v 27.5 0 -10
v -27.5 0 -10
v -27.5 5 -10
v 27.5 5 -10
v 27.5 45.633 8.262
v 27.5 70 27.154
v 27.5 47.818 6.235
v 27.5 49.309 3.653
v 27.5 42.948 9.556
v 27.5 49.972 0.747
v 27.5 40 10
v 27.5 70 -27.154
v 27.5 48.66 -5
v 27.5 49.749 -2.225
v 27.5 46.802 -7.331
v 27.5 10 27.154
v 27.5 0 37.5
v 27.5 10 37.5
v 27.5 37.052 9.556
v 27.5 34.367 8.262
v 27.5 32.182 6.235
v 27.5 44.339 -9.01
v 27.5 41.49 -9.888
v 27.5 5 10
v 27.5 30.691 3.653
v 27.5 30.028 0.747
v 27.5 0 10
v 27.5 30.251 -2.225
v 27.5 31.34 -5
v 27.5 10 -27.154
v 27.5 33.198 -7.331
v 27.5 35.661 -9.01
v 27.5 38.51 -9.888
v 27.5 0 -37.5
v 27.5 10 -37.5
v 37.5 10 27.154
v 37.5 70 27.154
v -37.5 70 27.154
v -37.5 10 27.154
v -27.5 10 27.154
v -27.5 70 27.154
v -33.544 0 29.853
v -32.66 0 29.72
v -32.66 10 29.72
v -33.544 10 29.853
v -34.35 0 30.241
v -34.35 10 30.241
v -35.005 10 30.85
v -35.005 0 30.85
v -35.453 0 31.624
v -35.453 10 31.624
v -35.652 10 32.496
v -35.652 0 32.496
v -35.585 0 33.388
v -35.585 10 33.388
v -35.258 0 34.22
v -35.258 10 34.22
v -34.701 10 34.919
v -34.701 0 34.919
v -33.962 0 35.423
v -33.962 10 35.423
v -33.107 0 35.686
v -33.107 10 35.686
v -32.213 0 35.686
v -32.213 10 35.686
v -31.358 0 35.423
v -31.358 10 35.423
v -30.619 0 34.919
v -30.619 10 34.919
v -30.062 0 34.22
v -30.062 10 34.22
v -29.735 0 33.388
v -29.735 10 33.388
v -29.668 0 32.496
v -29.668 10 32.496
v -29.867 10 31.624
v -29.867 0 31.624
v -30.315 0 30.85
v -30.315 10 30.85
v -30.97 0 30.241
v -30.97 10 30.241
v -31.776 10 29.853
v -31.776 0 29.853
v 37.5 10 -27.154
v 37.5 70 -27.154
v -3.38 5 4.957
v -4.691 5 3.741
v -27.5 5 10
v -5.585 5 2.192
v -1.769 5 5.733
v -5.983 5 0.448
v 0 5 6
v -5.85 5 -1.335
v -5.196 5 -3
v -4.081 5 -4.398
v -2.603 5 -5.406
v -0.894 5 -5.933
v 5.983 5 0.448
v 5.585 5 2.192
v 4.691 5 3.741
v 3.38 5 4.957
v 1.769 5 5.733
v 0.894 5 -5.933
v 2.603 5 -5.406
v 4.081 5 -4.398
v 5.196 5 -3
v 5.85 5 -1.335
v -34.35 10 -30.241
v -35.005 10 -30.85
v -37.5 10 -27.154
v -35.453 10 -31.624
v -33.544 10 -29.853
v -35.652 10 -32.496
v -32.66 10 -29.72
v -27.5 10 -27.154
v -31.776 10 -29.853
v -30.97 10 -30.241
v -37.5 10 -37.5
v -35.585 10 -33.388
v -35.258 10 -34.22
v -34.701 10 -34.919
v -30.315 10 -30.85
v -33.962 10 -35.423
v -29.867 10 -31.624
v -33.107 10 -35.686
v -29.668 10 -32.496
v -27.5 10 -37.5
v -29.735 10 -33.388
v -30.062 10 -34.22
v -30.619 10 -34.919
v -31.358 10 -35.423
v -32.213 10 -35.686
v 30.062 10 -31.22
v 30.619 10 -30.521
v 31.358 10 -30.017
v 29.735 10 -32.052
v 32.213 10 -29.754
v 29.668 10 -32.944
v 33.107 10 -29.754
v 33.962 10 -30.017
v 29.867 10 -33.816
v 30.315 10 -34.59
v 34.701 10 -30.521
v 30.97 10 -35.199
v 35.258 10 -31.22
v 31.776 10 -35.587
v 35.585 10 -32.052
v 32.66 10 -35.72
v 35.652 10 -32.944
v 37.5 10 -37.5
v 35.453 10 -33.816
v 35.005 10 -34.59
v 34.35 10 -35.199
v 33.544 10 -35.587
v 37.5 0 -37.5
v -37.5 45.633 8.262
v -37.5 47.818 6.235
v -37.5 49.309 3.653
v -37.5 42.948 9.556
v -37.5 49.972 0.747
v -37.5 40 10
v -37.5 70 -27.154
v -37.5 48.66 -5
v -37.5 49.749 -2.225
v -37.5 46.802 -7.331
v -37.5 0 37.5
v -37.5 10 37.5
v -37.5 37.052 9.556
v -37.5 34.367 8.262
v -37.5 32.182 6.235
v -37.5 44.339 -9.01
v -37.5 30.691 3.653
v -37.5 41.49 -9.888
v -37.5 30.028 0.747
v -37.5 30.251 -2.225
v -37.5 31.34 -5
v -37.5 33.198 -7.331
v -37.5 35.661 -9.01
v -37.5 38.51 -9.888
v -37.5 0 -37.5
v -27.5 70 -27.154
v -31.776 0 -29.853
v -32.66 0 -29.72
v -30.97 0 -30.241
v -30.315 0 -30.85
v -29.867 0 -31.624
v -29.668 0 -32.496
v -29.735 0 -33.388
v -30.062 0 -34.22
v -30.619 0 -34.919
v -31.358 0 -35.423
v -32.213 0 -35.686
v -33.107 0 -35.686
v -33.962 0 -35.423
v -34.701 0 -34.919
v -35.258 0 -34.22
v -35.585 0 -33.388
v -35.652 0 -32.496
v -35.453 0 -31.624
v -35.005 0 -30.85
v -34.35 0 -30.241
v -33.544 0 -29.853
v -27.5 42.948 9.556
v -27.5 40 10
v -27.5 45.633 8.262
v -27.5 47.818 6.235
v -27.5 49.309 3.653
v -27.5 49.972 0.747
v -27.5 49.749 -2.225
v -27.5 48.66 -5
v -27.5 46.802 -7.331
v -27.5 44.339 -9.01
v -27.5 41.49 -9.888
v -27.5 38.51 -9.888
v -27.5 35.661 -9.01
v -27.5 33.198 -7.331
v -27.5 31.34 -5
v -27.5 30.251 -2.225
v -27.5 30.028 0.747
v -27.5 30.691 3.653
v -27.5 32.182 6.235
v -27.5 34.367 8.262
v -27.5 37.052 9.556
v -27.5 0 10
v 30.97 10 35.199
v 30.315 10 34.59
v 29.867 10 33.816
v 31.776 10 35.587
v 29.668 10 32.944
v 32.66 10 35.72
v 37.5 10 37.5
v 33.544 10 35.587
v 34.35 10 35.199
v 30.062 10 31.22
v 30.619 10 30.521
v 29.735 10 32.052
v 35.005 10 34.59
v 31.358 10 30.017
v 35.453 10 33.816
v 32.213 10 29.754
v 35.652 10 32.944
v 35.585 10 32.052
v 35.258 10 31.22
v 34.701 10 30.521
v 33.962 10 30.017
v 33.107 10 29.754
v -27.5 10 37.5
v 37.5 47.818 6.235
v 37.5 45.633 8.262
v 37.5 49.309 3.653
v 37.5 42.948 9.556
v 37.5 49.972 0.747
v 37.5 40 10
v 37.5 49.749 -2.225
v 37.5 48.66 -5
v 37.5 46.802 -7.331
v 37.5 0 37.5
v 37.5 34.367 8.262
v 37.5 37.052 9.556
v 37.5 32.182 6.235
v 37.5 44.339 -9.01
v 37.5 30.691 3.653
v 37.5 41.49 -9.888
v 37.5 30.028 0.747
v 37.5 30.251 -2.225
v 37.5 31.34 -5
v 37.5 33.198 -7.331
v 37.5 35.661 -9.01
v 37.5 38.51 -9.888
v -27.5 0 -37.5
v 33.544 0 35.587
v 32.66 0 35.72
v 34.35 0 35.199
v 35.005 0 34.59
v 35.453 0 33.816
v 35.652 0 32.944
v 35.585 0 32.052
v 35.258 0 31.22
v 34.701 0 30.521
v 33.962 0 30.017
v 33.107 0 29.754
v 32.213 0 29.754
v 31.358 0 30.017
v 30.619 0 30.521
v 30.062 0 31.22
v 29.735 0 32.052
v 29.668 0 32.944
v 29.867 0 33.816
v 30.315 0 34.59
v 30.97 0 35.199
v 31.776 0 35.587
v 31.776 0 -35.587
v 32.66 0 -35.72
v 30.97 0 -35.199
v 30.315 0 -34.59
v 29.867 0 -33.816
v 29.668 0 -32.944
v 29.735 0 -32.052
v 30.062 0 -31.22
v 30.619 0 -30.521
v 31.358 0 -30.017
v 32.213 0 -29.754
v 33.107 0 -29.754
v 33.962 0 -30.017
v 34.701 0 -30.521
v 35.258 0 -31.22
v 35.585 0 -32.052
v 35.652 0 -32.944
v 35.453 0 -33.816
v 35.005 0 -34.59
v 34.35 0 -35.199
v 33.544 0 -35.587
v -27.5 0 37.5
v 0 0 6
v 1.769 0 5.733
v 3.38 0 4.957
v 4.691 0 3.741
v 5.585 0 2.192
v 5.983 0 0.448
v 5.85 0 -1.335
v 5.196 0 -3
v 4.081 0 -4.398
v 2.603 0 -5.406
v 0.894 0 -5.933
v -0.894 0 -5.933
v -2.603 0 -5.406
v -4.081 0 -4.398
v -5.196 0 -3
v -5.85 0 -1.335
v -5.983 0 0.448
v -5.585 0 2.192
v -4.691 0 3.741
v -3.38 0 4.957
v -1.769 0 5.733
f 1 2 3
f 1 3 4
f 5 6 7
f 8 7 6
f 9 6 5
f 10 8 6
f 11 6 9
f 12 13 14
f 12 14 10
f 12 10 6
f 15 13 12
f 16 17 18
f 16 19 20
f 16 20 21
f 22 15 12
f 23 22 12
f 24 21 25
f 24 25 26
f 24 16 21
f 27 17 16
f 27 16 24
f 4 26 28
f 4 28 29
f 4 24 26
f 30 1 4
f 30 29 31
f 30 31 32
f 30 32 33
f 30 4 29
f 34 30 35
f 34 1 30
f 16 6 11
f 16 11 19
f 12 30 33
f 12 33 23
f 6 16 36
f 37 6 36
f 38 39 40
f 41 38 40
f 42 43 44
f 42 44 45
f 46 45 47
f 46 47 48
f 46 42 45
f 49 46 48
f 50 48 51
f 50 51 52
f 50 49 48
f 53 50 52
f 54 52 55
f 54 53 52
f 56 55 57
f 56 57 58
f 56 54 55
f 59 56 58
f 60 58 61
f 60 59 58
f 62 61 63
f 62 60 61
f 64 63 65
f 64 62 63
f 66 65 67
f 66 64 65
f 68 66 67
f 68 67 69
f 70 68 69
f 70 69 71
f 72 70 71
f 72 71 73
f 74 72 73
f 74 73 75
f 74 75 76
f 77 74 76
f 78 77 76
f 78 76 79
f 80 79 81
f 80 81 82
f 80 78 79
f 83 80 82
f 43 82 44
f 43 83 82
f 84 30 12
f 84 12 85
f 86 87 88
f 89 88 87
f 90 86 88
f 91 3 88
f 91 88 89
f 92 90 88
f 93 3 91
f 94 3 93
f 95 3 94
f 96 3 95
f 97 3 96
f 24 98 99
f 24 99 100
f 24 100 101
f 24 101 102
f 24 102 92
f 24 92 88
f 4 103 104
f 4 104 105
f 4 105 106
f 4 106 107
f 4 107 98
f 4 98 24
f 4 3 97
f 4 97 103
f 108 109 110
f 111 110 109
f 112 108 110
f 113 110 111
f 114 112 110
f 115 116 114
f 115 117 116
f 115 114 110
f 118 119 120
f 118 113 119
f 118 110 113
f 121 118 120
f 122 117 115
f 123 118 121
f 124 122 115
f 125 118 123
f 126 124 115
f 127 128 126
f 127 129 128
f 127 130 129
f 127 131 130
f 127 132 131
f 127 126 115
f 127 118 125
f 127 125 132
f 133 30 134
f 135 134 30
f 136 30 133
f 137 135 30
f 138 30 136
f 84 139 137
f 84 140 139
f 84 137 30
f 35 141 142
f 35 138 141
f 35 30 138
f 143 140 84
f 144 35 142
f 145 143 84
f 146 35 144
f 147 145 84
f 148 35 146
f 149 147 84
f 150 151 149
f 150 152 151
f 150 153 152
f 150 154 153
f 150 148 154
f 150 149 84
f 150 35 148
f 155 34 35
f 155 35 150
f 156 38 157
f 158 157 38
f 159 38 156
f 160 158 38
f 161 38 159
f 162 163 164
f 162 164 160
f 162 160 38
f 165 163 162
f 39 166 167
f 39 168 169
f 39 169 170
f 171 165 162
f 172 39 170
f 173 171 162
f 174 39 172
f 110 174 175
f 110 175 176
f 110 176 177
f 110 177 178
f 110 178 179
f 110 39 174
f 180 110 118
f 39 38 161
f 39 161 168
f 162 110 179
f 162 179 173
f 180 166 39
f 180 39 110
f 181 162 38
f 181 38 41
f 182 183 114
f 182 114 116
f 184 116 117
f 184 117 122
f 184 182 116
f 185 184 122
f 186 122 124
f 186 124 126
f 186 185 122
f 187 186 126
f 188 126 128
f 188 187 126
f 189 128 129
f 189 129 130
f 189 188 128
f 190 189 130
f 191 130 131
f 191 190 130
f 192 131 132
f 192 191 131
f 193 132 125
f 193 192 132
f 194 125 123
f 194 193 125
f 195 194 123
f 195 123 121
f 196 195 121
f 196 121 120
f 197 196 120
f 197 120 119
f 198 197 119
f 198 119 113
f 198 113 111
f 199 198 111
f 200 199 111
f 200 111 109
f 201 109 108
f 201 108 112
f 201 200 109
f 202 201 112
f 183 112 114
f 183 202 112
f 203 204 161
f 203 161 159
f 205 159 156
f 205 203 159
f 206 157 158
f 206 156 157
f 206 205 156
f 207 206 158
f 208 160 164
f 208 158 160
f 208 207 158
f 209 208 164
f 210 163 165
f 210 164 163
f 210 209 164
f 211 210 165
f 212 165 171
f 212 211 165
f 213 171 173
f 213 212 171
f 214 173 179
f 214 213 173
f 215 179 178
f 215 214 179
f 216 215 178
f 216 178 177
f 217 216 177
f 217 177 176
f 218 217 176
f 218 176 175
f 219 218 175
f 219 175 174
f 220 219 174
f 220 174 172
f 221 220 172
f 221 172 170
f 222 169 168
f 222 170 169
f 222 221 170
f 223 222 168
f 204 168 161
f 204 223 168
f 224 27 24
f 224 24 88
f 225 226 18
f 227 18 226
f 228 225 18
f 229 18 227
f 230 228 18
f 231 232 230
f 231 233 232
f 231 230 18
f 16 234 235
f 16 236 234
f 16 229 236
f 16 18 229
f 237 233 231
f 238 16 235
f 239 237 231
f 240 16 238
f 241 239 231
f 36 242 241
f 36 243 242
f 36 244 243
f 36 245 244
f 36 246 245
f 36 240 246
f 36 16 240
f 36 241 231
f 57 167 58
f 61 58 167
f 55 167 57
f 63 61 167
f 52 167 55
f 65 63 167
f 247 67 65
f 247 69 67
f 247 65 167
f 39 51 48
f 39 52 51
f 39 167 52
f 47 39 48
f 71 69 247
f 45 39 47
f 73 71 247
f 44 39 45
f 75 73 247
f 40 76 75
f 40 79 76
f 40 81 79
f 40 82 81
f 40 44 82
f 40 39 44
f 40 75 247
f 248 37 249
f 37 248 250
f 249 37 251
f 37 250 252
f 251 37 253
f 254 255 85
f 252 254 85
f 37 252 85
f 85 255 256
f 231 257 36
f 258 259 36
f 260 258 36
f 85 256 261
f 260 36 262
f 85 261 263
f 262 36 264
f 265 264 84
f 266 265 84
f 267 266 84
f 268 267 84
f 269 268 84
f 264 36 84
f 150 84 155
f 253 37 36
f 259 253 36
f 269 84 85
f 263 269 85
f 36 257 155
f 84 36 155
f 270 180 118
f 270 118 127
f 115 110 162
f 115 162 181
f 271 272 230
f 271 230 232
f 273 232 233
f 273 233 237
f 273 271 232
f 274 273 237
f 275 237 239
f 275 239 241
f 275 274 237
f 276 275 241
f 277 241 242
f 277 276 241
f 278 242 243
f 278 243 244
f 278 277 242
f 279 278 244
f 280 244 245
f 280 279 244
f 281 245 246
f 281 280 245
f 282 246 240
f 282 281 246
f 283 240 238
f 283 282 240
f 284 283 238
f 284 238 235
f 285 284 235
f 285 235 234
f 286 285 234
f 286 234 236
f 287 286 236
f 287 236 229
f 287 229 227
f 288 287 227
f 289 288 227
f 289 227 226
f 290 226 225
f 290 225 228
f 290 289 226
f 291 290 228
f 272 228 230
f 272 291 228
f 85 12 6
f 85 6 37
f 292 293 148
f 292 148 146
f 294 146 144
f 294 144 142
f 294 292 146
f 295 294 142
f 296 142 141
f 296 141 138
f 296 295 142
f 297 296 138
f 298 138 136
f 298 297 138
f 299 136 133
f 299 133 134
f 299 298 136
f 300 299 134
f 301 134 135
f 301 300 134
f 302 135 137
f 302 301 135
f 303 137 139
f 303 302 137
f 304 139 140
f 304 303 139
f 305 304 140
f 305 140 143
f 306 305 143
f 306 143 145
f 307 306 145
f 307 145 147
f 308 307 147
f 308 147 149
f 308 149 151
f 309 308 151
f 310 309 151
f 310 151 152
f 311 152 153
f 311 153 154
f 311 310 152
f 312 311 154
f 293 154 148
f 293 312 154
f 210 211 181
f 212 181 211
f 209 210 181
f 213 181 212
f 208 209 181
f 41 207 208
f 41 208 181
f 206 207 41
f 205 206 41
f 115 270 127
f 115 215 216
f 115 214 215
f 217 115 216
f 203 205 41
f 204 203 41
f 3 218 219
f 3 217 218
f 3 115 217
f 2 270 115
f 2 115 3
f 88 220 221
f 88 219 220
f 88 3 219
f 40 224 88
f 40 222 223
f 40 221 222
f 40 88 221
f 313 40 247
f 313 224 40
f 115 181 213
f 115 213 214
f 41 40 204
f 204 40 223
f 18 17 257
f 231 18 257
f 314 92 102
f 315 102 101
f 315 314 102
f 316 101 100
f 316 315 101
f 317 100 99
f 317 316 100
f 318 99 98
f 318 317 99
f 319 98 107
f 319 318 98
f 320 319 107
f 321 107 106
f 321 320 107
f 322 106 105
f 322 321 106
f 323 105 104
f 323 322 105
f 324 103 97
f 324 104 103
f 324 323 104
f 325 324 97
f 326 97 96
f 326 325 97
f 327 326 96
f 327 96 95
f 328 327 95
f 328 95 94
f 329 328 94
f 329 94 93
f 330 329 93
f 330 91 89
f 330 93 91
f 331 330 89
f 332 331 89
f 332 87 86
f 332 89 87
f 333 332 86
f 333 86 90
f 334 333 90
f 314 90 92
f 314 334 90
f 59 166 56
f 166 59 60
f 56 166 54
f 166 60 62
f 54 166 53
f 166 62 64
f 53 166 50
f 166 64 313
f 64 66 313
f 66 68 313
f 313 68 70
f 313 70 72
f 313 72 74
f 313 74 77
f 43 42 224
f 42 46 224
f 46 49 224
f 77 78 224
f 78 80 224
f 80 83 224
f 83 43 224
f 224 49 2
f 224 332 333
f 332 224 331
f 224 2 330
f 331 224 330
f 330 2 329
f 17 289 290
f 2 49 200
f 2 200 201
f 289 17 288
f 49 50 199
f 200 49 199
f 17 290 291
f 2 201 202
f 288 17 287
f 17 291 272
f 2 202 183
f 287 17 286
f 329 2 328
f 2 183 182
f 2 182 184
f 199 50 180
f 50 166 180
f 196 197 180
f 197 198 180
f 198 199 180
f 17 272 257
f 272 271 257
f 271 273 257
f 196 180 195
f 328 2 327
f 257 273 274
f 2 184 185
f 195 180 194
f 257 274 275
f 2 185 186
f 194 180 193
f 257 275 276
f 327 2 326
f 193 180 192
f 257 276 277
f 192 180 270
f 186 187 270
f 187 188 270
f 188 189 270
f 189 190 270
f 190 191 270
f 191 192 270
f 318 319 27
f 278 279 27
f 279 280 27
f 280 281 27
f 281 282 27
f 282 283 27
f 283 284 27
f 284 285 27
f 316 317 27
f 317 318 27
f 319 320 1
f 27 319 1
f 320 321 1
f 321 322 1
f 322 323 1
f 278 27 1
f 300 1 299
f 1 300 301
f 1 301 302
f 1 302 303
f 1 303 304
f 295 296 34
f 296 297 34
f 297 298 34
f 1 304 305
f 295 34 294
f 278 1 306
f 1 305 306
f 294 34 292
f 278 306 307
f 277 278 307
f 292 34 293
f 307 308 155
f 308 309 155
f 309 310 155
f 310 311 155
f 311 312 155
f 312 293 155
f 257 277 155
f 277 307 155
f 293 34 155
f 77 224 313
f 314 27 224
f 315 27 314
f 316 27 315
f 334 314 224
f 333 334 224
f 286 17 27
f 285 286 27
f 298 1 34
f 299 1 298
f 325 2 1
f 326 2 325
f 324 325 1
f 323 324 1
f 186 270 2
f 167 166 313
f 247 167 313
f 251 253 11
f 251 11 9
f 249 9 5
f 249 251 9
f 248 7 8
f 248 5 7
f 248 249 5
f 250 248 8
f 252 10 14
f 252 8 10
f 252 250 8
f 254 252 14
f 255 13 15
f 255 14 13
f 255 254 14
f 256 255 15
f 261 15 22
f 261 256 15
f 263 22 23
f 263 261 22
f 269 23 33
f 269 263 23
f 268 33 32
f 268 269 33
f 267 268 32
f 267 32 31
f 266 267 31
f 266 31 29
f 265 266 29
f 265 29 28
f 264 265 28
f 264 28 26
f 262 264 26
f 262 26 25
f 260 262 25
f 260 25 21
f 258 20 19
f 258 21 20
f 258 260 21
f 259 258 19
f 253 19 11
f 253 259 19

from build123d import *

# Parameters (mm, degrees)
SKETCH1_W               = 75
SKETCH1_H               = 75
SKETCH1_R               = 3
SKETCH1_R_2             = 6
BOSS_EXTRUDE1_DEPTH     = 10
SKETCH2_W               = 10
SKETCH2_H               = 54.30825561
BOSS_EXTRUDE2_DEPTH     = 60
CUT_EXTRUDE1_DEPTH      = 110.230261375
CUT_EXTRUDE1_DEPTH_BACK = 110.230261375
SKETCH3_R               = 10
CUT_EXTRUDE2_DEPTH      = 81.07808689
CUT_EXTRUDE2_DEPTH_BACK = 81.07808689
SKETCH5_W               = 55
SKETCH5_H               = 20
CUT_EXTRUDE3_DEPTH      = 5


with BuildPart() as part:
    # Sketch1 → Boss-Extrude1 (new body)
    with BuildSketch(Plane(origin=(0, 0, 0), x_dir=(1, 0, 0), z_dir=(0, 1, 0))):
        Rectangle(SKETCH1_W, SKETCH1_H)
        with Locations(Location((-32.66, 32.72, 0), (0, 0, 270))):
            Circle(SKETCH1_R, mode=Mode.SUBTRACT)
        with Locations(Location((32.66, 32.72, 0), (0, 0, 90))):
            Circle(SKETCH1_R, mode=Mode.SUBTRACT)
        with Locations(Location((32.66, -32.72, 0), (0, 0, 270))):
            Circle(SKETCH1_R, mode=Mode.SUBTRACT)
        with Locations(Location((-32.66, -32.72, 0), (0, 0, 90))):
            Circle(SKETCH1_R, mode=Mode.SUBTRACT)
        with Locations(Location((0, 0, 0), (0, 0, 270))):
            Circle(SKETCH1_R_2, mode=Mode.SUBTRACT)
    extrude(amount=BOSS_EXTRUDE1_DEPTH)

    # Sketch2 → Boss-Extrude2 (add)
    with BuildSketch(Plane(origin=(0, 10, 0), x_dir=(1, 0, 0), z_dir=(0, 1, 0))):
        with Locations((-32.5, 0)):
            Rectangle(SKETCH2_W, SKETCH2_H)
        with Locations((32.5, 0)):
            Rectangle(SKETCH2_W, SKETCH2_H)
    extrude(amount=BOSS_EXTRUDE2_DEPTH)

    # Sketch3 → Cut-Extrude1 (cut, two sides: drawn at the far end of the back side and taken through both)
    with BuildSketch(Plane.ZY.offset(37.5).offset(-CUT_EXTRUDE1_DEPTH_BACK)):
        with Locations((0, 40)):
            Circle(SKETCH3_R)
    extrude(amount=CUT_EXTRUDE1_DEPTH + CUT_EXTRUDE1_DEPTH_BACK, mode=Mode.SUBTRACT)

    # Sketch4 → Cut-Extrude2 (cut, two sides: drawn at the far end of the back side and taken through both)
    with BuildSketch(Plane(origin=(0, 10, 0), x_dir=(1, 0, 0), z_dir=(0, 1, 0)).offset(-CUT_EXTRUDE2_DEPTH_BACK)):
        Polygon((-27.5, 10), (27.5, 10), (27.5, 27.154127805), (27.5, 37.5), (-27.5, 37.5), (-27.5, 27.154127805), align=None)
        Polygon((27.5, -27.154127805), (27.5, -10), (-27.5, -10), (-27.5, -27.154127805), (-27.5, -37.5), (27.5, -37.5), align=None)
    extrude(amount=CUT_EXTRUDE2_DEPTH + CUT_EXTRUDE2_DEPTH_BACK, mode=Mode.SUBTRACT)

    # Sketch5 → Cut-Extrude3 (cut)
    with BuildSketch(Plane(origin=(0, 10, 0), x_dir=(1, 0, 0), z_dir=(0, 1, 0))):
        Rectangle(SKETCH5_W, SKETCH5_H)
    extrude(amount=-CUT_EXTRUDE3_DEPTH, mode=Mode.SUBTRACT)


solid = part.part
